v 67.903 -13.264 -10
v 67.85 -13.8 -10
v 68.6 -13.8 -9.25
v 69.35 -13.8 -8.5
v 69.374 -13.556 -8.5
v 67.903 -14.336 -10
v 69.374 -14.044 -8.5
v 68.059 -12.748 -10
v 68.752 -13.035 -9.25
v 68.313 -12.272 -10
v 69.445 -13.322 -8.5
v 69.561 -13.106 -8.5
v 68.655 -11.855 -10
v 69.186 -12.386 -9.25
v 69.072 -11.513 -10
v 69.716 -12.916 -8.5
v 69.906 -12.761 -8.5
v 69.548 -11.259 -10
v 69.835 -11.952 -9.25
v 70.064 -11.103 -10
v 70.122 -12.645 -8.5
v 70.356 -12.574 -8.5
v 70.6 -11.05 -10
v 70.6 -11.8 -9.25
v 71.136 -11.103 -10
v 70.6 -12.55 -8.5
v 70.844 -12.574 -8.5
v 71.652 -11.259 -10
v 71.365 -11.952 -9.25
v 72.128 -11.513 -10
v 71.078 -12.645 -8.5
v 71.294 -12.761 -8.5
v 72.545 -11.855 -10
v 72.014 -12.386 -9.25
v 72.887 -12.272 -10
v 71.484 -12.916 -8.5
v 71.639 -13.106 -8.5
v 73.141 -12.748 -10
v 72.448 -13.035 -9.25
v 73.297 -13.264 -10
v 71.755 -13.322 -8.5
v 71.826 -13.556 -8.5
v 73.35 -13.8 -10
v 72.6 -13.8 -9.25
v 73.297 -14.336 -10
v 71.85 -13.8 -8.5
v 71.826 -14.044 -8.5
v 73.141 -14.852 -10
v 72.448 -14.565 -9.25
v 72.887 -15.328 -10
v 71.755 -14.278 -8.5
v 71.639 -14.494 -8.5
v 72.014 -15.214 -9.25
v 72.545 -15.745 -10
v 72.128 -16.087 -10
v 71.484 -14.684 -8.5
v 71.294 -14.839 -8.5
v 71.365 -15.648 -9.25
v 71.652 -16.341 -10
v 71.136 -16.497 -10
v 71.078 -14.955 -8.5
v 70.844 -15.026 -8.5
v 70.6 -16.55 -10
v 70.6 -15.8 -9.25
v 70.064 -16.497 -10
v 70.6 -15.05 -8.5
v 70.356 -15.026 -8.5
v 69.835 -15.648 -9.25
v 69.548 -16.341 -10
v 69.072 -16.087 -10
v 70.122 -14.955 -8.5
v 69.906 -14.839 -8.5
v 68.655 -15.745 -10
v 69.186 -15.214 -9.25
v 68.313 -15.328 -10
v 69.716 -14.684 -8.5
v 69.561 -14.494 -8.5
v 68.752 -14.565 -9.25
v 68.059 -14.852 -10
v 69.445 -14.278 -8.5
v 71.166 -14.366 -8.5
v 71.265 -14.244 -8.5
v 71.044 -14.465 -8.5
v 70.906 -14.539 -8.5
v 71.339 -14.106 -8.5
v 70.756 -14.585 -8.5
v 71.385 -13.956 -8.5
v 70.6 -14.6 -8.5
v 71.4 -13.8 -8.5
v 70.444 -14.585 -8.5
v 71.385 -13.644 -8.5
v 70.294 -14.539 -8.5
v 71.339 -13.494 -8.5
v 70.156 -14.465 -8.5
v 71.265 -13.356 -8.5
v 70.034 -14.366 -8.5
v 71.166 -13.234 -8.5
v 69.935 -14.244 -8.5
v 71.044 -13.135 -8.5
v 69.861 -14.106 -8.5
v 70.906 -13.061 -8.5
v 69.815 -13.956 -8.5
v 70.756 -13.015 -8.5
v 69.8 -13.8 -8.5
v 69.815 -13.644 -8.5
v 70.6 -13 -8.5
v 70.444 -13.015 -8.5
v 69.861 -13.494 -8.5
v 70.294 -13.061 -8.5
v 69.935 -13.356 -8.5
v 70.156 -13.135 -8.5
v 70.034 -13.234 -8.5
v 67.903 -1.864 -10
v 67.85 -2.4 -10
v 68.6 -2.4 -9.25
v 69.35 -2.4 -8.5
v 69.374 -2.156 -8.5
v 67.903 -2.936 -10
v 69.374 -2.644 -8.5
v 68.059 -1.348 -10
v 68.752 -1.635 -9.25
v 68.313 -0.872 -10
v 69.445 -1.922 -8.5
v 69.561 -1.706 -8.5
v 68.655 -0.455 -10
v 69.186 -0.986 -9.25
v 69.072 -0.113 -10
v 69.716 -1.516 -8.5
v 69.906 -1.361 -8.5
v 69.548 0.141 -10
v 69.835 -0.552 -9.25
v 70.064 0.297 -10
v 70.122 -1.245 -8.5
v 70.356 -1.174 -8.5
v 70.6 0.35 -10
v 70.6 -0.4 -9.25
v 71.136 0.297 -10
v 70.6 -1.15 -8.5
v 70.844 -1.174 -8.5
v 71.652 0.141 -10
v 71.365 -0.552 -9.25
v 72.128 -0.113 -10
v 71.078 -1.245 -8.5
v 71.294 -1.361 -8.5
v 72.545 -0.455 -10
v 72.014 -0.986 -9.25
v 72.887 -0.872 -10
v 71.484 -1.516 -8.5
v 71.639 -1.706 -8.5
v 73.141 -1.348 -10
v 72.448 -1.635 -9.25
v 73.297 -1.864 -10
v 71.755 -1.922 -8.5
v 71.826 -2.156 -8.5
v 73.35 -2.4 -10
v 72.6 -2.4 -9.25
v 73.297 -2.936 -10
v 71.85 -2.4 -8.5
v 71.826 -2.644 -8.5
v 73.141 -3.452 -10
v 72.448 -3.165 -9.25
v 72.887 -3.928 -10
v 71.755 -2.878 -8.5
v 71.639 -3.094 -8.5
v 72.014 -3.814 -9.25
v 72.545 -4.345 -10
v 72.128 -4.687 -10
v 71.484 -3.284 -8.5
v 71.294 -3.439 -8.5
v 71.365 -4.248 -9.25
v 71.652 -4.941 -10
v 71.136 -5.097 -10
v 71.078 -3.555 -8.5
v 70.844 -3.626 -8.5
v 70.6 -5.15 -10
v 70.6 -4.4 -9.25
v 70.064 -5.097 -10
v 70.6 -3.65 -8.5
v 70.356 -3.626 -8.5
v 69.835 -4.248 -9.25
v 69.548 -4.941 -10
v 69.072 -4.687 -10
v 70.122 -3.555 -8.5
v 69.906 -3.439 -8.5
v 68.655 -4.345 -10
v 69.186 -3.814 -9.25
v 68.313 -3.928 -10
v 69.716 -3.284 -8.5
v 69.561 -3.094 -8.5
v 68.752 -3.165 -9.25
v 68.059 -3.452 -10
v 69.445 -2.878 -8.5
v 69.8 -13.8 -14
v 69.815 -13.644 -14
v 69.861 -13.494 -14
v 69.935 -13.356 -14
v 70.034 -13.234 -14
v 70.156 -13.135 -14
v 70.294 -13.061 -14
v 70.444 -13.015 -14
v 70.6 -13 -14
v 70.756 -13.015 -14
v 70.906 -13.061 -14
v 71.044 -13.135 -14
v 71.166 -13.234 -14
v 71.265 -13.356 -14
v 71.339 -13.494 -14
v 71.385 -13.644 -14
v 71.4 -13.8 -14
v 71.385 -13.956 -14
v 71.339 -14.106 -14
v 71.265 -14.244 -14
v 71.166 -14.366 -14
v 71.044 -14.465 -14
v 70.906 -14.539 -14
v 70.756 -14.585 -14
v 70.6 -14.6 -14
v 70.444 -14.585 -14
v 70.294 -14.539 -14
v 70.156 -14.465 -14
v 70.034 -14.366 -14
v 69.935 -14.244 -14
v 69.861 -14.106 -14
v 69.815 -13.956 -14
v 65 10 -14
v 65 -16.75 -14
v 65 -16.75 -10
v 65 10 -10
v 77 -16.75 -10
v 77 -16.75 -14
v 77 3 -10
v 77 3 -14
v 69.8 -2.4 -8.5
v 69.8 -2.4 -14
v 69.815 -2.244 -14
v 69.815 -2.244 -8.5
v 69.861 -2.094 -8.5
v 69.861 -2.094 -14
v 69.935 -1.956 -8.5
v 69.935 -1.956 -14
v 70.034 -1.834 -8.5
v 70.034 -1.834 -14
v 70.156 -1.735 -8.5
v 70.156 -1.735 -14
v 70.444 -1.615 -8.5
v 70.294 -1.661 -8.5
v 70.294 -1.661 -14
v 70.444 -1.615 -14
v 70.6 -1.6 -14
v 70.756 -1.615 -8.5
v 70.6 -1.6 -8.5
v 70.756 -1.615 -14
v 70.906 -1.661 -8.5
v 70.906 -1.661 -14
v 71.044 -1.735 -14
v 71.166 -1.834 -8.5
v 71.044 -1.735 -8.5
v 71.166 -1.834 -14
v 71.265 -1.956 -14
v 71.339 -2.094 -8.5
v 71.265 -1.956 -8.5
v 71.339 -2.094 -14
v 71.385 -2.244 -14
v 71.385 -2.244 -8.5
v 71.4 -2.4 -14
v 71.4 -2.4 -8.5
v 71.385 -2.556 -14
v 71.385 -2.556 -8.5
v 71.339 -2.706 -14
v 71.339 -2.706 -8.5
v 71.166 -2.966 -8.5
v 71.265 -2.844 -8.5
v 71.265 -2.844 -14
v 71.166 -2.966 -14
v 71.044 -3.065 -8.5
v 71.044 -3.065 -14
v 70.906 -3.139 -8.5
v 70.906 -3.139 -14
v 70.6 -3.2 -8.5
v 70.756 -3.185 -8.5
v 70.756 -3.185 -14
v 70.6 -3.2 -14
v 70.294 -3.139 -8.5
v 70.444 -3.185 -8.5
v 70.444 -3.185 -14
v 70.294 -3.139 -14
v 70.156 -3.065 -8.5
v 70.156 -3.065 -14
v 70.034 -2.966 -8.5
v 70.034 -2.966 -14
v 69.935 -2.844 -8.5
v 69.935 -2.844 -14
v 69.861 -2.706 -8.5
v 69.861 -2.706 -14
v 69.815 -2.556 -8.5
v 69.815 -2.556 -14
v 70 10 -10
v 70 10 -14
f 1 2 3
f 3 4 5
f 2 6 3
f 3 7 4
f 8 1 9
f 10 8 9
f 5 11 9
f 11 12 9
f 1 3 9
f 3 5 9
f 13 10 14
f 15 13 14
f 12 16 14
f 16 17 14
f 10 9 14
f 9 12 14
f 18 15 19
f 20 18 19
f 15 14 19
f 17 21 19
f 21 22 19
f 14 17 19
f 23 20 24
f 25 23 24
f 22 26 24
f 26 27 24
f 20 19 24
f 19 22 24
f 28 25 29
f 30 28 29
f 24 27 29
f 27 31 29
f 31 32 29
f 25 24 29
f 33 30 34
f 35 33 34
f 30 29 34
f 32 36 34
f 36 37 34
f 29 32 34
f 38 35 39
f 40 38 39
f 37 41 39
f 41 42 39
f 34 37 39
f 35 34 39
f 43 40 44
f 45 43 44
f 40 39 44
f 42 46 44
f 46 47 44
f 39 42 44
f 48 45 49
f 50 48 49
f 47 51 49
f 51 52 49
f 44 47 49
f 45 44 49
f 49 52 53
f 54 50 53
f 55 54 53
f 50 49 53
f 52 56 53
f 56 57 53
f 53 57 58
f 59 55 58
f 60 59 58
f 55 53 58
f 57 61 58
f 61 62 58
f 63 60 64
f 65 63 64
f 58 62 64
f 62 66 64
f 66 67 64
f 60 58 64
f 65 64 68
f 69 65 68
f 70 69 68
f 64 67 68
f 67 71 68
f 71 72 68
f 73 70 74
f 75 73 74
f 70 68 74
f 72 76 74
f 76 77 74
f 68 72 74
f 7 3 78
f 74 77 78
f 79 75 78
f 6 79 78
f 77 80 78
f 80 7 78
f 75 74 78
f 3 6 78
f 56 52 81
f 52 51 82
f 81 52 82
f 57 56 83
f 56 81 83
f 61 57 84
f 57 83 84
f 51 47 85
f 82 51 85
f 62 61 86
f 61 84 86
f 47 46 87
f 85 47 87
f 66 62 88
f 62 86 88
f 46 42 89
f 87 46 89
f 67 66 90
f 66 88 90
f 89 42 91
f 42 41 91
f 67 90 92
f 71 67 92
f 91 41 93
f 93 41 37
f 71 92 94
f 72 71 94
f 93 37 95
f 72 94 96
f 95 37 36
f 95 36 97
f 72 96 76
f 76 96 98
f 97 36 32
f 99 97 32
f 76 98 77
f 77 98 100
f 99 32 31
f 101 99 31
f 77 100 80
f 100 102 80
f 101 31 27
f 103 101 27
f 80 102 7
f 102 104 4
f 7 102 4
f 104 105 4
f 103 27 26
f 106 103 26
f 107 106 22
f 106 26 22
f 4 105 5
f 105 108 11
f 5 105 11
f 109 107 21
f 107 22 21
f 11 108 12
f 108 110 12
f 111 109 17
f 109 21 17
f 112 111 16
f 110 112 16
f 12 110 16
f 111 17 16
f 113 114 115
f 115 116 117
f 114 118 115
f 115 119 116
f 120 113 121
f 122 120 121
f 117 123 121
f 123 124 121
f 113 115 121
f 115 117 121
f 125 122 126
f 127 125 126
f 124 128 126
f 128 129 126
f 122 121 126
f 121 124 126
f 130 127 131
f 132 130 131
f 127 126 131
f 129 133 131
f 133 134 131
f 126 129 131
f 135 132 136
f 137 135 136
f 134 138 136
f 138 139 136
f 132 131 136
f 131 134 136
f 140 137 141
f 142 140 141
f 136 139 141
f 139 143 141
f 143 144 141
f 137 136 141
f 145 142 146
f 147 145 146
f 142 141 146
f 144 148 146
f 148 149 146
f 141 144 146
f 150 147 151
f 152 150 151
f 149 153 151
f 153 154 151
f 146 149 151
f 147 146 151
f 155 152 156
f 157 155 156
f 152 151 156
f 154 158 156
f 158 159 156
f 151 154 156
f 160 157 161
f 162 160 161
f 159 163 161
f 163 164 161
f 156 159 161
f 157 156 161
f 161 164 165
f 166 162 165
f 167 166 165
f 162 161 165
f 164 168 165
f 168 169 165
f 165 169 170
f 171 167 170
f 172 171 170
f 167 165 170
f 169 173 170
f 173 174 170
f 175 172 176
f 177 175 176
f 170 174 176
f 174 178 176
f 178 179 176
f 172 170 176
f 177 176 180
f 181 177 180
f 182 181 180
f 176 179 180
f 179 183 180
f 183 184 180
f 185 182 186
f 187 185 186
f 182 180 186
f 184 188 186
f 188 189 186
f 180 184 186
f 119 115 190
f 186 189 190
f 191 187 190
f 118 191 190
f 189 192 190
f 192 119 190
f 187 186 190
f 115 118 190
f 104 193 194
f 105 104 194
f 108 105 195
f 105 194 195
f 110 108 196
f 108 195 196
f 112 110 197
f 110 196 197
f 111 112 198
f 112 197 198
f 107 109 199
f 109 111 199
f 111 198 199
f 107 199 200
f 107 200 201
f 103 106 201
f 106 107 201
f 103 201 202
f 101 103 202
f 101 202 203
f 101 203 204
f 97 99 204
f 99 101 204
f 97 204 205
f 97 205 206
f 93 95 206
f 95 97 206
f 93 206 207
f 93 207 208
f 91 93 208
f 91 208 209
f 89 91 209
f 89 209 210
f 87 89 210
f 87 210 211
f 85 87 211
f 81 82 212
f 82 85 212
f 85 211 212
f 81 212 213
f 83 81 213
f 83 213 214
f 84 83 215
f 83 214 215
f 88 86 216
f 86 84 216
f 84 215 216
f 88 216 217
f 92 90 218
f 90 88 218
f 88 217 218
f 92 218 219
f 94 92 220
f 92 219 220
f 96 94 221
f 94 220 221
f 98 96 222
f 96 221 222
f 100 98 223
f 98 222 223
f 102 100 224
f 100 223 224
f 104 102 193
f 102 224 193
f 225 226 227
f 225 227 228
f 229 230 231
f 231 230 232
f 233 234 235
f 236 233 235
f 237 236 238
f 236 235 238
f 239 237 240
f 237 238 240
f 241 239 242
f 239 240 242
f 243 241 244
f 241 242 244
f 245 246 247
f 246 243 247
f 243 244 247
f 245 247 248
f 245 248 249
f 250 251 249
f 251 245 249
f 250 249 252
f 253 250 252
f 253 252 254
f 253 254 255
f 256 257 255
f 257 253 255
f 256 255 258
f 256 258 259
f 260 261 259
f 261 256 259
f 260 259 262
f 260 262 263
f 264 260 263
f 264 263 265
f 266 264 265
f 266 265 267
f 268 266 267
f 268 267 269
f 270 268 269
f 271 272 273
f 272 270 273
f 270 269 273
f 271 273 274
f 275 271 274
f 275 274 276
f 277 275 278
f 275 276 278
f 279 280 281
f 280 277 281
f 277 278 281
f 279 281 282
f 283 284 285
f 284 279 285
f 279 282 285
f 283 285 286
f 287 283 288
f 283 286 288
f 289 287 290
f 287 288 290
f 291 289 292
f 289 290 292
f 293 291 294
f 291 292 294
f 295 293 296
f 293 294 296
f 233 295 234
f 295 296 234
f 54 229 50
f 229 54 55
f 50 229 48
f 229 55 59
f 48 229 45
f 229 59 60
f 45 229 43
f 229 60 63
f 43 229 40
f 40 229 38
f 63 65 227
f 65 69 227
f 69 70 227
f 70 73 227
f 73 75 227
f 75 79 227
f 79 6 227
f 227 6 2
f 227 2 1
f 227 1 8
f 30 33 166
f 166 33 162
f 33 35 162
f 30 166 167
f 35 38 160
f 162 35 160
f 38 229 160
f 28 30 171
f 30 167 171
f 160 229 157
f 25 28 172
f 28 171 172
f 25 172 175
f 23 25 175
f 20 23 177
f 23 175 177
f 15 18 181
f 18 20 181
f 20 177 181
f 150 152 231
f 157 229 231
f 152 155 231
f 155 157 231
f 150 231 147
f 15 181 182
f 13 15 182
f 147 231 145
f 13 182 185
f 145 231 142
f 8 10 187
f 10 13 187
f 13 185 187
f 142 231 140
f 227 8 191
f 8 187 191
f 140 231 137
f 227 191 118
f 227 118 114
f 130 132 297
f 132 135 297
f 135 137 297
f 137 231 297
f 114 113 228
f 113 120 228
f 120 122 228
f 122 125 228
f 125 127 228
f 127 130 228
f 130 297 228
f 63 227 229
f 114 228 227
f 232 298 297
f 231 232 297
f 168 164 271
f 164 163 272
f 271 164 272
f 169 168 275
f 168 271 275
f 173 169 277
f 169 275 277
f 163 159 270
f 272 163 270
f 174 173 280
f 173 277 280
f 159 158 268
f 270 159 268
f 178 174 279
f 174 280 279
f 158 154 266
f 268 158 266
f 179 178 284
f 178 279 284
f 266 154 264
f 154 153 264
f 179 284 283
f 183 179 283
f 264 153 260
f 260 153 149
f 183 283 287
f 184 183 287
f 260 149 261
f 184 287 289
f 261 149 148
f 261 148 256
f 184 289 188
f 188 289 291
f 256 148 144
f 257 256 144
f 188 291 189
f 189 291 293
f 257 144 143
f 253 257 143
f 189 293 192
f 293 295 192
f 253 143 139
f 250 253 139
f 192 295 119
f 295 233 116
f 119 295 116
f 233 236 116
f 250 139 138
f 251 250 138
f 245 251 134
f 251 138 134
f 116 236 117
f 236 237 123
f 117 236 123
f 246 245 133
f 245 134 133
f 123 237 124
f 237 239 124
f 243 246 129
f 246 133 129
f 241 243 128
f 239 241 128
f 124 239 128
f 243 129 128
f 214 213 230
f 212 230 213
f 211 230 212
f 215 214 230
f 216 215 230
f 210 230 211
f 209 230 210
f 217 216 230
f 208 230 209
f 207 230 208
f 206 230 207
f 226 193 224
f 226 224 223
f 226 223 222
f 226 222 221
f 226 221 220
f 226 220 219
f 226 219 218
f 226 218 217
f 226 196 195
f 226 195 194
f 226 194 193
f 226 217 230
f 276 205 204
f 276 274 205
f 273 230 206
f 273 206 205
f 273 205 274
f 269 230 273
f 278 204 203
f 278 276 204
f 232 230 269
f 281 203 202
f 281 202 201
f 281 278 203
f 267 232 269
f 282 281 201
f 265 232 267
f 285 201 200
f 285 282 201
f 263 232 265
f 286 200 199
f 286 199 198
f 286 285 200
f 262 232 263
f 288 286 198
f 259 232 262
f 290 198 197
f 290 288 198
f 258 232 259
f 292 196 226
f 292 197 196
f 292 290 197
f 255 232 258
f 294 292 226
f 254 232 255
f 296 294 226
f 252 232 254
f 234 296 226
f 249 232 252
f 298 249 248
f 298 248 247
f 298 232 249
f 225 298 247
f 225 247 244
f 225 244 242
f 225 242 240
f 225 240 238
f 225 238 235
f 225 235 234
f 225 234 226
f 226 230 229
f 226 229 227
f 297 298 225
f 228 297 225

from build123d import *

# Parameters (mm, degrees)
CYLINDER082_R     = 0.8
CYLINDER082_DEPTH = 14.5
CYLINDER081_R     = 0.8
CYLINDER081_DEPTH = 14.5
BOX044_W          = 12
BOX044_H          = 26.75
BOX044_DEPTH      = 4
CHAMFER001_SIZE   = 7


with BuildPart() as cylinder134:
    # Cylinder082 → Cylinder082 (new body)
    with BuildSketch(Plane(origin=(-43.6, -13.8, -15), x_dir=(1, 0, 0), z_dir=(0, 0, 1))):
        Circle(CYLINDER082_R)
    extrude(amount=CYLINDER082_DEPTH)


with BuildPart() as fusion116:
    # Cylinder081 → Cylinder081 (new body)
    with BuildSketch(Plane(origin=(-43.6, -2.4, -15), x_dir=(1, 0, 0), z_dir=(0, 0, 1))):
        Circle(CYLINDER081_R)
    extrude(amount=CYLINDER081_DEPTH)

    # Fusion116: union Cylinder134
    add(cylinder134.part)


with BuildPart() as cone003:
    # Cone003 → Cone003 (revolve)
    with BuildSketch(Plane(origin=(-43.6, -13.8, -10), x_dir=(1, 0, 0), z_dir=(0, -1, 0))):
        Polygon((0, 0), (2.75, 0), (1.25, 1.5), (0, 1.5), align=None)
    revolve(axis=Axis((-43.6, -13.8, -10), (0, 0, 1)))


with BuildPart() as fusion114:
    # Cone002 → Cone002 (revolve)
    with BuildSketch(Plane(origin=(-43.6, -2.4, -10), x_dir=(1, 0, 0), z_dir=(0, -1, 0))):
        Polygon((0, 0), (2.75, 0), (1.25, 1.5), (0, 1.5), align=None)
    revolve(axis=Axis((-43.6, -2.4, -10), (0, 0, 1)))

    # Fusion114: union Cone003
    add(cone003.part)


with BuildPart() as cut045028:
    # Box044 → Box044 (new body)
    with BuildSketch(Plane(origin=(-50, -16.75, -14), x_dir=(1, 0, 0), z_dir=(0, 0, 1))):
        with Locations((6, 13.375)):
            Rectangle(BOX044_W, BOX044_H)
    extrude(amount=BOX044_DEPTH)

    # Chamfer001
    chamfer001_edges = [cut045028.edges().sort_by_distance(p)[0] for p in [
        (-50, 10, -12),
    ]]
    chamfer(chamfer001_edges, length=CHAMFER001_SIZE)

    # Fusion115: union Fusion114
    add(fusion114.part)

    # Cut045028: cut Fusion116
    add(fusion116.part, mode=Mode.SUBTRACT)


with BuildPart() as part_mirroring005:
    # Part__Mirroring005: instance of Cut045028
    add(cut045028.part.mirror(Plane(origin=(0, 0, 0), x_dir=(0, -1, 0), z_dir=(1, 0, 0))))


with BuildPart() as part_mirroring005_1:
    # Part__Mirroring005 placement: moved
    add(part_mirroring005.part.moved(Location((27, 0, 0))))


solid = part_mirroring005_1.part
